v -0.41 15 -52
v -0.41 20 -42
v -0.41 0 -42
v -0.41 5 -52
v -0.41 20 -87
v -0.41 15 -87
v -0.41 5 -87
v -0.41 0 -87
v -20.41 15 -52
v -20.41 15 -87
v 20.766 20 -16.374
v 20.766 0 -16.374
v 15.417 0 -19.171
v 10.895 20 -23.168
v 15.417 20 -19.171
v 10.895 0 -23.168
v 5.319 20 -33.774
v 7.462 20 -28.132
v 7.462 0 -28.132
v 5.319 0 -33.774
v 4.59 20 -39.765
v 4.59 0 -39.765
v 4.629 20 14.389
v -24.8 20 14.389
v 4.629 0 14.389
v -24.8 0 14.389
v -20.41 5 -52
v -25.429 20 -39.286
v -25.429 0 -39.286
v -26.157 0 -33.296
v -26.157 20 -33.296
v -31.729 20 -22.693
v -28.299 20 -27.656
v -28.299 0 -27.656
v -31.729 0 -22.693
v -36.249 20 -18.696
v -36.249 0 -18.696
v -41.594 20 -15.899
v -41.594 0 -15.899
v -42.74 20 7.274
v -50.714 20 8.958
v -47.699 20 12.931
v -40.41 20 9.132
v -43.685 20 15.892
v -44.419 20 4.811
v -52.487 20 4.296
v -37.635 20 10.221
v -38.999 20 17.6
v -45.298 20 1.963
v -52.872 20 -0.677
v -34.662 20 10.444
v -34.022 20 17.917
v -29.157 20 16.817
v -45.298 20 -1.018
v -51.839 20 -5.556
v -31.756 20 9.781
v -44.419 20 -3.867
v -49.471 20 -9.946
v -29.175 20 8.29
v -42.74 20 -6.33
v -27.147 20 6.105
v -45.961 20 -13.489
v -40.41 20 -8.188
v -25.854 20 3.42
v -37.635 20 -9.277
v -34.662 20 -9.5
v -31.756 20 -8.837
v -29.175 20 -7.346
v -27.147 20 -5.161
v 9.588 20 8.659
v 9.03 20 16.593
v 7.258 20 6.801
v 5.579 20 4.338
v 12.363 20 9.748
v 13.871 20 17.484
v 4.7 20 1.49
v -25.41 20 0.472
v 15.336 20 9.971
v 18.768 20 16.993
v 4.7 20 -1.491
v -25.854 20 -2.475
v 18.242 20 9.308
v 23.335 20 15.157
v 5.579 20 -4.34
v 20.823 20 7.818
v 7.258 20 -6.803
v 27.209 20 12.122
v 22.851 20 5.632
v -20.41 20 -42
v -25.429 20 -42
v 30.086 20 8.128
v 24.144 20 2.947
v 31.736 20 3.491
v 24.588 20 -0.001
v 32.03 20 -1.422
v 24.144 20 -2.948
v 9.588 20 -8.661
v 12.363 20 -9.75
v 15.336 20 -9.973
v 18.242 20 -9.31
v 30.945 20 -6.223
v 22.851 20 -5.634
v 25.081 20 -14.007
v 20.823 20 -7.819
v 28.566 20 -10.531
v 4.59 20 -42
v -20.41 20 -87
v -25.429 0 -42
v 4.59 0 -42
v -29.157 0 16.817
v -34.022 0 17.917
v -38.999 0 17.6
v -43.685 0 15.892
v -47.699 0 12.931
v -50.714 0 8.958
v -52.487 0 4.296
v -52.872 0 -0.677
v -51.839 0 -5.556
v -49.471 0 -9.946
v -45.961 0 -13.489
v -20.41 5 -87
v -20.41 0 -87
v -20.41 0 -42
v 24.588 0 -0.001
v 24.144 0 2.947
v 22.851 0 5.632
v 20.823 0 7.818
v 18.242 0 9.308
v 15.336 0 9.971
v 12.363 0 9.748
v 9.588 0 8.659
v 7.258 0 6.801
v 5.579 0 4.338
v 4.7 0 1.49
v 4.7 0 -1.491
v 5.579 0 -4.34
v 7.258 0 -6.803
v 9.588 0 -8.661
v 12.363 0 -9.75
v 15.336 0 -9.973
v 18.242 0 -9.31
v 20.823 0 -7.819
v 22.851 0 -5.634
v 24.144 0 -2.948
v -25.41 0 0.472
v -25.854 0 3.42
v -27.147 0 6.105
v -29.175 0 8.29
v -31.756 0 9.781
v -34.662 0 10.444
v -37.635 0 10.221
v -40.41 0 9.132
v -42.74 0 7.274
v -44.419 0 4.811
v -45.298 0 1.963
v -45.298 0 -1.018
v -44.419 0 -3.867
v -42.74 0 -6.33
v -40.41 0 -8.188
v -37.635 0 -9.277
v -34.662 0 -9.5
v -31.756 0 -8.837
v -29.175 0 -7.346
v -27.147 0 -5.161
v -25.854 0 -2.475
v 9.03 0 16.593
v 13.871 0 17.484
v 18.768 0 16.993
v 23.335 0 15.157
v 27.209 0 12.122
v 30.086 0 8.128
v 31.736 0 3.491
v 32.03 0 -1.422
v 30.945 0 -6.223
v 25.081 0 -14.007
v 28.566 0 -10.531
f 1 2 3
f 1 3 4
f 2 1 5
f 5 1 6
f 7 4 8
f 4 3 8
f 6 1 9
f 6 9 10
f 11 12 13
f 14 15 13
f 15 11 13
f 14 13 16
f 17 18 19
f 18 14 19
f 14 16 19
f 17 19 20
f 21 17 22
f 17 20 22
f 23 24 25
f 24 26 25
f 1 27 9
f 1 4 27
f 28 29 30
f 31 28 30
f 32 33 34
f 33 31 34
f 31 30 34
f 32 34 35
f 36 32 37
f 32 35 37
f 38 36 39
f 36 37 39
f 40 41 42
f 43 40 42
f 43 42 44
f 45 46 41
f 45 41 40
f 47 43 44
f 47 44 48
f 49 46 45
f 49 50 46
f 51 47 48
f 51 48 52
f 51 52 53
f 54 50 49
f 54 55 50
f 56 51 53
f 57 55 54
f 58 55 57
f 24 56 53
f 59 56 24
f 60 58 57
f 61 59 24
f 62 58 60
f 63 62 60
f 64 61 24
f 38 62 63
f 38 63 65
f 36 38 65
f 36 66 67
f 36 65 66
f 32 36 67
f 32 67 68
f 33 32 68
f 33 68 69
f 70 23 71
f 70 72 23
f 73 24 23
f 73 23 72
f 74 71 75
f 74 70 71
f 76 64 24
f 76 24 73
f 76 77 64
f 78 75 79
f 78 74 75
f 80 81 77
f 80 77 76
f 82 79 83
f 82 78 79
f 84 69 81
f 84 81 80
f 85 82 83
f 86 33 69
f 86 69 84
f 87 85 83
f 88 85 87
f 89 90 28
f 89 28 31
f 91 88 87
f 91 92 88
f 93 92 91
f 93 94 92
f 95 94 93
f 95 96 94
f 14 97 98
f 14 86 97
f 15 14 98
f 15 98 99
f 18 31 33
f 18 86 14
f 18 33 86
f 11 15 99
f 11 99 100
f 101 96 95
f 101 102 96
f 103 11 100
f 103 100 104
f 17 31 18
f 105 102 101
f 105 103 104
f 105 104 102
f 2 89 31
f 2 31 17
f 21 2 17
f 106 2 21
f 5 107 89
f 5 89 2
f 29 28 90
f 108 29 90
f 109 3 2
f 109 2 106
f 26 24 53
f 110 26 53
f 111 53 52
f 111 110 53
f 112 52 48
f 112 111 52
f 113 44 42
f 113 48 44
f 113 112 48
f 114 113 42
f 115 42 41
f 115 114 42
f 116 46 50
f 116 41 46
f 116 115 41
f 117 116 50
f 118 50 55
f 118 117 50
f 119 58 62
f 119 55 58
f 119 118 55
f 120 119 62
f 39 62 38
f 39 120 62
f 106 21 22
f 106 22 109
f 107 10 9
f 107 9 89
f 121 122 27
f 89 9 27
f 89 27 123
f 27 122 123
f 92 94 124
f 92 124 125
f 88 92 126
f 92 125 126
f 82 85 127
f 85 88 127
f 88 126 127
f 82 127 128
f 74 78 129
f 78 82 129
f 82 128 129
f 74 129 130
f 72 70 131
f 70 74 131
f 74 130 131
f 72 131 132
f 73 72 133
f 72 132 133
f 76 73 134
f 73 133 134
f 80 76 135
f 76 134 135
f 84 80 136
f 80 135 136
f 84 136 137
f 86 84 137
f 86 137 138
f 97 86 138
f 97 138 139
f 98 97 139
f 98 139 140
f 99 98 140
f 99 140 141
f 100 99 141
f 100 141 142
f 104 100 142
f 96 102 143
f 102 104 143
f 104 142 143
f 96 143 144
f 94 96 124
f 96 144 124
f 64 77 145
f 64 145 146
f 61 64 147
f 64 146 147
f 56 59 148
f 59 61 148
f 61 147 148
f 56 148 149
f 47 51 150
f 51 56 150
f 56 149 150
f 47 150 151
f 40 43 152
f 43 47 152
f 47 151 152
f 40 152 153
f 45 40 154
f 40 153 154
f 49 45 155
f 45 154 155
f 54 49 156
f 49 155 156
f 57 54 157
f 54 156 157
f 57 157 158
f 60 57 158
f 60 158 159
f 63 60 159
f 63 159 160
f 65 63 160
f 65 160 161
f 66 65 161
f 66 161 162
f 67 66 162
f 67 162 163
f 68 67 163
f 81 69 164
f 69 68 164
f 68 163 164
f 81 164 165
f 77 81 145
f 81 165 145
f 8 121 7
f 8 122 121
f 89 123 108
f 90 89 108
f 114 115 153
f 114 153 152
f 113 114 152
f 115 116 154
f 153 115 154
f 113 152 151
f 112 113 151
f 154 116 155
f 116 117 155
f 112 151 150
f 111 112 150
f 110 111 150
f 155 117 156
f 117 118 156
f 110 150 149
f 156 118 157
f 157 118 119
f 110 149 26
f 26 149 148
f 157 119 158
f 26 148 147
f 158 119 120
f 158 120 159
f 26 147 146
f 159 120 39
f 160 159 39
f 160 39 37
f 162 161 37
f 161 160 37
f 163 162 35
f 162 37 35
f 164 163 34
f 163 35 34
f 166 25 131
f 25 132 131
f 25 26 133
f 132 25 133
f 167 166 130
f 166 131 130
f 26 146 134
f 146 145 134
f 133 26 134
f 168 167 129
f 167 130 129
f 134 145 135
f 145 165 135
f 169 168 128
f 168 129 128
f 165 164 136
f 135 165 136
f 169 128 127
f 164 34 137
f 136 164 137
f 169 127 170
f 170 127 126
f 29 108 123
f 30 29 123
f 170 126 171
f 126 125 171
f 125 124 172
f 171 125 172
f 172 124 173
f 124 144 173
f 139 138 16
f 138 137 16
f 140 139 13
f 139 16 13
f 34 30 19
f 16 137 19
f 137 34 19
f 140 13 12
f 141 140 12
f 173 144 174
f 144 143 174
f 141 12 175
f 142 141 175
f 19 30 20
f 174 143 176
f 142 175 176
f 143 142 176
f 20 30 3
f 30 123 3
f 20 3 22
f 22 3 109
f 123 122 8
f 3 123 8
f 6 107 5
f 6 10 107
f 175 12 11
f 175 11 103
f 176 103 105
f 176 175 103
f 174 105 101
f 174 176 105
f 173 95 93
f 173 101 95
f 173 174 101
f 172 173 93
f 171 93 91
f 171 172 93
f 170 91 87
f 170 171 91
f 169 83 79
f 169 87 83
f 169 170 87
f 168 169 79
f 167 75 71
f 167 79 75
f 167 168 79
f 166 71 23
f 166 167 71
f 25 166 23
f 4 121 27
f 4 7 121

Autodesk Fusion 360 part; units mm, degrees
sketch "Sketch1" plane through (0, 0, 0) normal (0, 1, 0) x (1, 0, 0)
  circle A0 centre (-35.4096, -0.4721) radius 10
  circle A1 centre (14.5882, 0.0008) radius 10
  line L0 (-0.4096, 42) -> (-0.4096, 87)
  line L1 (-20.4096, 87) -> (-20.4096, 42)
  line L2 (-25.429, 39.2855) -> (-25.429, 42)
  line L3 (4.5904, 39.7649) -> (4.5904, 42)
  line L4 (-20.4096, 42) -> (-25.429, 42)
  line L5 (-25.429, 42) -> (-20.4096, 42)
  line L6 (-0.4096, 42) -> (4.5904, 42)
  arc A2 (4.6294, -14.3892) -> (20.7656, 16.3743) centre (14.5882, 0.0008) ccw
  arc A3 (-41.594, 15.8987) -> (-24.8, -14.3892) centre (-35.4096, -0.4721) ccw
  arc A4 (-41.594, 15.8987) -> (-25.429, 39.2855) centre (-50.429, 39.2855) ccw
  arc A5 (4.5904, 39.7649) -> (20.7656, 16.3743) centre (29.5904, 39.7649) ccw
  line L7 (-24.8, -14.3892) -> (4.6294, -14.3892)
  line L8 (-20.4096, 87) -> (-0.4096, 87)
  dimension "d1" = 50
  dimension "d2" = 20
  dimension "d3" = 20
  dimension "d4" = 35
  dimension "d5" = 35
  dimension "d9" = 20
  dimension "d10" = 45
  dimension "d11" = 15
  dimension "d16" = 25
  dimension "d17" = 25
extrude "Extrude1" add sketch "Sketch1" along normal blind 20
sketch "Sketch2" plane through (-0.4096, 0, 0) normal (1, 0, 0) x (0, 1, 0)
  line L0 (0, -42) -> (0, -87)
  line L1 (0, -87) -> (20, -87)
  line L2 (20, -87) -> (20, -42)
  line L3 (20, -42) -> (0, -42)
  line L4 (5, -52) -> (15, -52)
  line L5 (15, -52) -> (15, -87)
  line L6 (15, -87) -> (5, -87)
  line L7 (5, -87) -> (5, -52)
  dimension "d26" = 10
  dimension "d27" = 35
extrude "Extrude2" cut sketch "Sketch2" against normal blind 47.149 contours L1 L4 L5 L6 L7
